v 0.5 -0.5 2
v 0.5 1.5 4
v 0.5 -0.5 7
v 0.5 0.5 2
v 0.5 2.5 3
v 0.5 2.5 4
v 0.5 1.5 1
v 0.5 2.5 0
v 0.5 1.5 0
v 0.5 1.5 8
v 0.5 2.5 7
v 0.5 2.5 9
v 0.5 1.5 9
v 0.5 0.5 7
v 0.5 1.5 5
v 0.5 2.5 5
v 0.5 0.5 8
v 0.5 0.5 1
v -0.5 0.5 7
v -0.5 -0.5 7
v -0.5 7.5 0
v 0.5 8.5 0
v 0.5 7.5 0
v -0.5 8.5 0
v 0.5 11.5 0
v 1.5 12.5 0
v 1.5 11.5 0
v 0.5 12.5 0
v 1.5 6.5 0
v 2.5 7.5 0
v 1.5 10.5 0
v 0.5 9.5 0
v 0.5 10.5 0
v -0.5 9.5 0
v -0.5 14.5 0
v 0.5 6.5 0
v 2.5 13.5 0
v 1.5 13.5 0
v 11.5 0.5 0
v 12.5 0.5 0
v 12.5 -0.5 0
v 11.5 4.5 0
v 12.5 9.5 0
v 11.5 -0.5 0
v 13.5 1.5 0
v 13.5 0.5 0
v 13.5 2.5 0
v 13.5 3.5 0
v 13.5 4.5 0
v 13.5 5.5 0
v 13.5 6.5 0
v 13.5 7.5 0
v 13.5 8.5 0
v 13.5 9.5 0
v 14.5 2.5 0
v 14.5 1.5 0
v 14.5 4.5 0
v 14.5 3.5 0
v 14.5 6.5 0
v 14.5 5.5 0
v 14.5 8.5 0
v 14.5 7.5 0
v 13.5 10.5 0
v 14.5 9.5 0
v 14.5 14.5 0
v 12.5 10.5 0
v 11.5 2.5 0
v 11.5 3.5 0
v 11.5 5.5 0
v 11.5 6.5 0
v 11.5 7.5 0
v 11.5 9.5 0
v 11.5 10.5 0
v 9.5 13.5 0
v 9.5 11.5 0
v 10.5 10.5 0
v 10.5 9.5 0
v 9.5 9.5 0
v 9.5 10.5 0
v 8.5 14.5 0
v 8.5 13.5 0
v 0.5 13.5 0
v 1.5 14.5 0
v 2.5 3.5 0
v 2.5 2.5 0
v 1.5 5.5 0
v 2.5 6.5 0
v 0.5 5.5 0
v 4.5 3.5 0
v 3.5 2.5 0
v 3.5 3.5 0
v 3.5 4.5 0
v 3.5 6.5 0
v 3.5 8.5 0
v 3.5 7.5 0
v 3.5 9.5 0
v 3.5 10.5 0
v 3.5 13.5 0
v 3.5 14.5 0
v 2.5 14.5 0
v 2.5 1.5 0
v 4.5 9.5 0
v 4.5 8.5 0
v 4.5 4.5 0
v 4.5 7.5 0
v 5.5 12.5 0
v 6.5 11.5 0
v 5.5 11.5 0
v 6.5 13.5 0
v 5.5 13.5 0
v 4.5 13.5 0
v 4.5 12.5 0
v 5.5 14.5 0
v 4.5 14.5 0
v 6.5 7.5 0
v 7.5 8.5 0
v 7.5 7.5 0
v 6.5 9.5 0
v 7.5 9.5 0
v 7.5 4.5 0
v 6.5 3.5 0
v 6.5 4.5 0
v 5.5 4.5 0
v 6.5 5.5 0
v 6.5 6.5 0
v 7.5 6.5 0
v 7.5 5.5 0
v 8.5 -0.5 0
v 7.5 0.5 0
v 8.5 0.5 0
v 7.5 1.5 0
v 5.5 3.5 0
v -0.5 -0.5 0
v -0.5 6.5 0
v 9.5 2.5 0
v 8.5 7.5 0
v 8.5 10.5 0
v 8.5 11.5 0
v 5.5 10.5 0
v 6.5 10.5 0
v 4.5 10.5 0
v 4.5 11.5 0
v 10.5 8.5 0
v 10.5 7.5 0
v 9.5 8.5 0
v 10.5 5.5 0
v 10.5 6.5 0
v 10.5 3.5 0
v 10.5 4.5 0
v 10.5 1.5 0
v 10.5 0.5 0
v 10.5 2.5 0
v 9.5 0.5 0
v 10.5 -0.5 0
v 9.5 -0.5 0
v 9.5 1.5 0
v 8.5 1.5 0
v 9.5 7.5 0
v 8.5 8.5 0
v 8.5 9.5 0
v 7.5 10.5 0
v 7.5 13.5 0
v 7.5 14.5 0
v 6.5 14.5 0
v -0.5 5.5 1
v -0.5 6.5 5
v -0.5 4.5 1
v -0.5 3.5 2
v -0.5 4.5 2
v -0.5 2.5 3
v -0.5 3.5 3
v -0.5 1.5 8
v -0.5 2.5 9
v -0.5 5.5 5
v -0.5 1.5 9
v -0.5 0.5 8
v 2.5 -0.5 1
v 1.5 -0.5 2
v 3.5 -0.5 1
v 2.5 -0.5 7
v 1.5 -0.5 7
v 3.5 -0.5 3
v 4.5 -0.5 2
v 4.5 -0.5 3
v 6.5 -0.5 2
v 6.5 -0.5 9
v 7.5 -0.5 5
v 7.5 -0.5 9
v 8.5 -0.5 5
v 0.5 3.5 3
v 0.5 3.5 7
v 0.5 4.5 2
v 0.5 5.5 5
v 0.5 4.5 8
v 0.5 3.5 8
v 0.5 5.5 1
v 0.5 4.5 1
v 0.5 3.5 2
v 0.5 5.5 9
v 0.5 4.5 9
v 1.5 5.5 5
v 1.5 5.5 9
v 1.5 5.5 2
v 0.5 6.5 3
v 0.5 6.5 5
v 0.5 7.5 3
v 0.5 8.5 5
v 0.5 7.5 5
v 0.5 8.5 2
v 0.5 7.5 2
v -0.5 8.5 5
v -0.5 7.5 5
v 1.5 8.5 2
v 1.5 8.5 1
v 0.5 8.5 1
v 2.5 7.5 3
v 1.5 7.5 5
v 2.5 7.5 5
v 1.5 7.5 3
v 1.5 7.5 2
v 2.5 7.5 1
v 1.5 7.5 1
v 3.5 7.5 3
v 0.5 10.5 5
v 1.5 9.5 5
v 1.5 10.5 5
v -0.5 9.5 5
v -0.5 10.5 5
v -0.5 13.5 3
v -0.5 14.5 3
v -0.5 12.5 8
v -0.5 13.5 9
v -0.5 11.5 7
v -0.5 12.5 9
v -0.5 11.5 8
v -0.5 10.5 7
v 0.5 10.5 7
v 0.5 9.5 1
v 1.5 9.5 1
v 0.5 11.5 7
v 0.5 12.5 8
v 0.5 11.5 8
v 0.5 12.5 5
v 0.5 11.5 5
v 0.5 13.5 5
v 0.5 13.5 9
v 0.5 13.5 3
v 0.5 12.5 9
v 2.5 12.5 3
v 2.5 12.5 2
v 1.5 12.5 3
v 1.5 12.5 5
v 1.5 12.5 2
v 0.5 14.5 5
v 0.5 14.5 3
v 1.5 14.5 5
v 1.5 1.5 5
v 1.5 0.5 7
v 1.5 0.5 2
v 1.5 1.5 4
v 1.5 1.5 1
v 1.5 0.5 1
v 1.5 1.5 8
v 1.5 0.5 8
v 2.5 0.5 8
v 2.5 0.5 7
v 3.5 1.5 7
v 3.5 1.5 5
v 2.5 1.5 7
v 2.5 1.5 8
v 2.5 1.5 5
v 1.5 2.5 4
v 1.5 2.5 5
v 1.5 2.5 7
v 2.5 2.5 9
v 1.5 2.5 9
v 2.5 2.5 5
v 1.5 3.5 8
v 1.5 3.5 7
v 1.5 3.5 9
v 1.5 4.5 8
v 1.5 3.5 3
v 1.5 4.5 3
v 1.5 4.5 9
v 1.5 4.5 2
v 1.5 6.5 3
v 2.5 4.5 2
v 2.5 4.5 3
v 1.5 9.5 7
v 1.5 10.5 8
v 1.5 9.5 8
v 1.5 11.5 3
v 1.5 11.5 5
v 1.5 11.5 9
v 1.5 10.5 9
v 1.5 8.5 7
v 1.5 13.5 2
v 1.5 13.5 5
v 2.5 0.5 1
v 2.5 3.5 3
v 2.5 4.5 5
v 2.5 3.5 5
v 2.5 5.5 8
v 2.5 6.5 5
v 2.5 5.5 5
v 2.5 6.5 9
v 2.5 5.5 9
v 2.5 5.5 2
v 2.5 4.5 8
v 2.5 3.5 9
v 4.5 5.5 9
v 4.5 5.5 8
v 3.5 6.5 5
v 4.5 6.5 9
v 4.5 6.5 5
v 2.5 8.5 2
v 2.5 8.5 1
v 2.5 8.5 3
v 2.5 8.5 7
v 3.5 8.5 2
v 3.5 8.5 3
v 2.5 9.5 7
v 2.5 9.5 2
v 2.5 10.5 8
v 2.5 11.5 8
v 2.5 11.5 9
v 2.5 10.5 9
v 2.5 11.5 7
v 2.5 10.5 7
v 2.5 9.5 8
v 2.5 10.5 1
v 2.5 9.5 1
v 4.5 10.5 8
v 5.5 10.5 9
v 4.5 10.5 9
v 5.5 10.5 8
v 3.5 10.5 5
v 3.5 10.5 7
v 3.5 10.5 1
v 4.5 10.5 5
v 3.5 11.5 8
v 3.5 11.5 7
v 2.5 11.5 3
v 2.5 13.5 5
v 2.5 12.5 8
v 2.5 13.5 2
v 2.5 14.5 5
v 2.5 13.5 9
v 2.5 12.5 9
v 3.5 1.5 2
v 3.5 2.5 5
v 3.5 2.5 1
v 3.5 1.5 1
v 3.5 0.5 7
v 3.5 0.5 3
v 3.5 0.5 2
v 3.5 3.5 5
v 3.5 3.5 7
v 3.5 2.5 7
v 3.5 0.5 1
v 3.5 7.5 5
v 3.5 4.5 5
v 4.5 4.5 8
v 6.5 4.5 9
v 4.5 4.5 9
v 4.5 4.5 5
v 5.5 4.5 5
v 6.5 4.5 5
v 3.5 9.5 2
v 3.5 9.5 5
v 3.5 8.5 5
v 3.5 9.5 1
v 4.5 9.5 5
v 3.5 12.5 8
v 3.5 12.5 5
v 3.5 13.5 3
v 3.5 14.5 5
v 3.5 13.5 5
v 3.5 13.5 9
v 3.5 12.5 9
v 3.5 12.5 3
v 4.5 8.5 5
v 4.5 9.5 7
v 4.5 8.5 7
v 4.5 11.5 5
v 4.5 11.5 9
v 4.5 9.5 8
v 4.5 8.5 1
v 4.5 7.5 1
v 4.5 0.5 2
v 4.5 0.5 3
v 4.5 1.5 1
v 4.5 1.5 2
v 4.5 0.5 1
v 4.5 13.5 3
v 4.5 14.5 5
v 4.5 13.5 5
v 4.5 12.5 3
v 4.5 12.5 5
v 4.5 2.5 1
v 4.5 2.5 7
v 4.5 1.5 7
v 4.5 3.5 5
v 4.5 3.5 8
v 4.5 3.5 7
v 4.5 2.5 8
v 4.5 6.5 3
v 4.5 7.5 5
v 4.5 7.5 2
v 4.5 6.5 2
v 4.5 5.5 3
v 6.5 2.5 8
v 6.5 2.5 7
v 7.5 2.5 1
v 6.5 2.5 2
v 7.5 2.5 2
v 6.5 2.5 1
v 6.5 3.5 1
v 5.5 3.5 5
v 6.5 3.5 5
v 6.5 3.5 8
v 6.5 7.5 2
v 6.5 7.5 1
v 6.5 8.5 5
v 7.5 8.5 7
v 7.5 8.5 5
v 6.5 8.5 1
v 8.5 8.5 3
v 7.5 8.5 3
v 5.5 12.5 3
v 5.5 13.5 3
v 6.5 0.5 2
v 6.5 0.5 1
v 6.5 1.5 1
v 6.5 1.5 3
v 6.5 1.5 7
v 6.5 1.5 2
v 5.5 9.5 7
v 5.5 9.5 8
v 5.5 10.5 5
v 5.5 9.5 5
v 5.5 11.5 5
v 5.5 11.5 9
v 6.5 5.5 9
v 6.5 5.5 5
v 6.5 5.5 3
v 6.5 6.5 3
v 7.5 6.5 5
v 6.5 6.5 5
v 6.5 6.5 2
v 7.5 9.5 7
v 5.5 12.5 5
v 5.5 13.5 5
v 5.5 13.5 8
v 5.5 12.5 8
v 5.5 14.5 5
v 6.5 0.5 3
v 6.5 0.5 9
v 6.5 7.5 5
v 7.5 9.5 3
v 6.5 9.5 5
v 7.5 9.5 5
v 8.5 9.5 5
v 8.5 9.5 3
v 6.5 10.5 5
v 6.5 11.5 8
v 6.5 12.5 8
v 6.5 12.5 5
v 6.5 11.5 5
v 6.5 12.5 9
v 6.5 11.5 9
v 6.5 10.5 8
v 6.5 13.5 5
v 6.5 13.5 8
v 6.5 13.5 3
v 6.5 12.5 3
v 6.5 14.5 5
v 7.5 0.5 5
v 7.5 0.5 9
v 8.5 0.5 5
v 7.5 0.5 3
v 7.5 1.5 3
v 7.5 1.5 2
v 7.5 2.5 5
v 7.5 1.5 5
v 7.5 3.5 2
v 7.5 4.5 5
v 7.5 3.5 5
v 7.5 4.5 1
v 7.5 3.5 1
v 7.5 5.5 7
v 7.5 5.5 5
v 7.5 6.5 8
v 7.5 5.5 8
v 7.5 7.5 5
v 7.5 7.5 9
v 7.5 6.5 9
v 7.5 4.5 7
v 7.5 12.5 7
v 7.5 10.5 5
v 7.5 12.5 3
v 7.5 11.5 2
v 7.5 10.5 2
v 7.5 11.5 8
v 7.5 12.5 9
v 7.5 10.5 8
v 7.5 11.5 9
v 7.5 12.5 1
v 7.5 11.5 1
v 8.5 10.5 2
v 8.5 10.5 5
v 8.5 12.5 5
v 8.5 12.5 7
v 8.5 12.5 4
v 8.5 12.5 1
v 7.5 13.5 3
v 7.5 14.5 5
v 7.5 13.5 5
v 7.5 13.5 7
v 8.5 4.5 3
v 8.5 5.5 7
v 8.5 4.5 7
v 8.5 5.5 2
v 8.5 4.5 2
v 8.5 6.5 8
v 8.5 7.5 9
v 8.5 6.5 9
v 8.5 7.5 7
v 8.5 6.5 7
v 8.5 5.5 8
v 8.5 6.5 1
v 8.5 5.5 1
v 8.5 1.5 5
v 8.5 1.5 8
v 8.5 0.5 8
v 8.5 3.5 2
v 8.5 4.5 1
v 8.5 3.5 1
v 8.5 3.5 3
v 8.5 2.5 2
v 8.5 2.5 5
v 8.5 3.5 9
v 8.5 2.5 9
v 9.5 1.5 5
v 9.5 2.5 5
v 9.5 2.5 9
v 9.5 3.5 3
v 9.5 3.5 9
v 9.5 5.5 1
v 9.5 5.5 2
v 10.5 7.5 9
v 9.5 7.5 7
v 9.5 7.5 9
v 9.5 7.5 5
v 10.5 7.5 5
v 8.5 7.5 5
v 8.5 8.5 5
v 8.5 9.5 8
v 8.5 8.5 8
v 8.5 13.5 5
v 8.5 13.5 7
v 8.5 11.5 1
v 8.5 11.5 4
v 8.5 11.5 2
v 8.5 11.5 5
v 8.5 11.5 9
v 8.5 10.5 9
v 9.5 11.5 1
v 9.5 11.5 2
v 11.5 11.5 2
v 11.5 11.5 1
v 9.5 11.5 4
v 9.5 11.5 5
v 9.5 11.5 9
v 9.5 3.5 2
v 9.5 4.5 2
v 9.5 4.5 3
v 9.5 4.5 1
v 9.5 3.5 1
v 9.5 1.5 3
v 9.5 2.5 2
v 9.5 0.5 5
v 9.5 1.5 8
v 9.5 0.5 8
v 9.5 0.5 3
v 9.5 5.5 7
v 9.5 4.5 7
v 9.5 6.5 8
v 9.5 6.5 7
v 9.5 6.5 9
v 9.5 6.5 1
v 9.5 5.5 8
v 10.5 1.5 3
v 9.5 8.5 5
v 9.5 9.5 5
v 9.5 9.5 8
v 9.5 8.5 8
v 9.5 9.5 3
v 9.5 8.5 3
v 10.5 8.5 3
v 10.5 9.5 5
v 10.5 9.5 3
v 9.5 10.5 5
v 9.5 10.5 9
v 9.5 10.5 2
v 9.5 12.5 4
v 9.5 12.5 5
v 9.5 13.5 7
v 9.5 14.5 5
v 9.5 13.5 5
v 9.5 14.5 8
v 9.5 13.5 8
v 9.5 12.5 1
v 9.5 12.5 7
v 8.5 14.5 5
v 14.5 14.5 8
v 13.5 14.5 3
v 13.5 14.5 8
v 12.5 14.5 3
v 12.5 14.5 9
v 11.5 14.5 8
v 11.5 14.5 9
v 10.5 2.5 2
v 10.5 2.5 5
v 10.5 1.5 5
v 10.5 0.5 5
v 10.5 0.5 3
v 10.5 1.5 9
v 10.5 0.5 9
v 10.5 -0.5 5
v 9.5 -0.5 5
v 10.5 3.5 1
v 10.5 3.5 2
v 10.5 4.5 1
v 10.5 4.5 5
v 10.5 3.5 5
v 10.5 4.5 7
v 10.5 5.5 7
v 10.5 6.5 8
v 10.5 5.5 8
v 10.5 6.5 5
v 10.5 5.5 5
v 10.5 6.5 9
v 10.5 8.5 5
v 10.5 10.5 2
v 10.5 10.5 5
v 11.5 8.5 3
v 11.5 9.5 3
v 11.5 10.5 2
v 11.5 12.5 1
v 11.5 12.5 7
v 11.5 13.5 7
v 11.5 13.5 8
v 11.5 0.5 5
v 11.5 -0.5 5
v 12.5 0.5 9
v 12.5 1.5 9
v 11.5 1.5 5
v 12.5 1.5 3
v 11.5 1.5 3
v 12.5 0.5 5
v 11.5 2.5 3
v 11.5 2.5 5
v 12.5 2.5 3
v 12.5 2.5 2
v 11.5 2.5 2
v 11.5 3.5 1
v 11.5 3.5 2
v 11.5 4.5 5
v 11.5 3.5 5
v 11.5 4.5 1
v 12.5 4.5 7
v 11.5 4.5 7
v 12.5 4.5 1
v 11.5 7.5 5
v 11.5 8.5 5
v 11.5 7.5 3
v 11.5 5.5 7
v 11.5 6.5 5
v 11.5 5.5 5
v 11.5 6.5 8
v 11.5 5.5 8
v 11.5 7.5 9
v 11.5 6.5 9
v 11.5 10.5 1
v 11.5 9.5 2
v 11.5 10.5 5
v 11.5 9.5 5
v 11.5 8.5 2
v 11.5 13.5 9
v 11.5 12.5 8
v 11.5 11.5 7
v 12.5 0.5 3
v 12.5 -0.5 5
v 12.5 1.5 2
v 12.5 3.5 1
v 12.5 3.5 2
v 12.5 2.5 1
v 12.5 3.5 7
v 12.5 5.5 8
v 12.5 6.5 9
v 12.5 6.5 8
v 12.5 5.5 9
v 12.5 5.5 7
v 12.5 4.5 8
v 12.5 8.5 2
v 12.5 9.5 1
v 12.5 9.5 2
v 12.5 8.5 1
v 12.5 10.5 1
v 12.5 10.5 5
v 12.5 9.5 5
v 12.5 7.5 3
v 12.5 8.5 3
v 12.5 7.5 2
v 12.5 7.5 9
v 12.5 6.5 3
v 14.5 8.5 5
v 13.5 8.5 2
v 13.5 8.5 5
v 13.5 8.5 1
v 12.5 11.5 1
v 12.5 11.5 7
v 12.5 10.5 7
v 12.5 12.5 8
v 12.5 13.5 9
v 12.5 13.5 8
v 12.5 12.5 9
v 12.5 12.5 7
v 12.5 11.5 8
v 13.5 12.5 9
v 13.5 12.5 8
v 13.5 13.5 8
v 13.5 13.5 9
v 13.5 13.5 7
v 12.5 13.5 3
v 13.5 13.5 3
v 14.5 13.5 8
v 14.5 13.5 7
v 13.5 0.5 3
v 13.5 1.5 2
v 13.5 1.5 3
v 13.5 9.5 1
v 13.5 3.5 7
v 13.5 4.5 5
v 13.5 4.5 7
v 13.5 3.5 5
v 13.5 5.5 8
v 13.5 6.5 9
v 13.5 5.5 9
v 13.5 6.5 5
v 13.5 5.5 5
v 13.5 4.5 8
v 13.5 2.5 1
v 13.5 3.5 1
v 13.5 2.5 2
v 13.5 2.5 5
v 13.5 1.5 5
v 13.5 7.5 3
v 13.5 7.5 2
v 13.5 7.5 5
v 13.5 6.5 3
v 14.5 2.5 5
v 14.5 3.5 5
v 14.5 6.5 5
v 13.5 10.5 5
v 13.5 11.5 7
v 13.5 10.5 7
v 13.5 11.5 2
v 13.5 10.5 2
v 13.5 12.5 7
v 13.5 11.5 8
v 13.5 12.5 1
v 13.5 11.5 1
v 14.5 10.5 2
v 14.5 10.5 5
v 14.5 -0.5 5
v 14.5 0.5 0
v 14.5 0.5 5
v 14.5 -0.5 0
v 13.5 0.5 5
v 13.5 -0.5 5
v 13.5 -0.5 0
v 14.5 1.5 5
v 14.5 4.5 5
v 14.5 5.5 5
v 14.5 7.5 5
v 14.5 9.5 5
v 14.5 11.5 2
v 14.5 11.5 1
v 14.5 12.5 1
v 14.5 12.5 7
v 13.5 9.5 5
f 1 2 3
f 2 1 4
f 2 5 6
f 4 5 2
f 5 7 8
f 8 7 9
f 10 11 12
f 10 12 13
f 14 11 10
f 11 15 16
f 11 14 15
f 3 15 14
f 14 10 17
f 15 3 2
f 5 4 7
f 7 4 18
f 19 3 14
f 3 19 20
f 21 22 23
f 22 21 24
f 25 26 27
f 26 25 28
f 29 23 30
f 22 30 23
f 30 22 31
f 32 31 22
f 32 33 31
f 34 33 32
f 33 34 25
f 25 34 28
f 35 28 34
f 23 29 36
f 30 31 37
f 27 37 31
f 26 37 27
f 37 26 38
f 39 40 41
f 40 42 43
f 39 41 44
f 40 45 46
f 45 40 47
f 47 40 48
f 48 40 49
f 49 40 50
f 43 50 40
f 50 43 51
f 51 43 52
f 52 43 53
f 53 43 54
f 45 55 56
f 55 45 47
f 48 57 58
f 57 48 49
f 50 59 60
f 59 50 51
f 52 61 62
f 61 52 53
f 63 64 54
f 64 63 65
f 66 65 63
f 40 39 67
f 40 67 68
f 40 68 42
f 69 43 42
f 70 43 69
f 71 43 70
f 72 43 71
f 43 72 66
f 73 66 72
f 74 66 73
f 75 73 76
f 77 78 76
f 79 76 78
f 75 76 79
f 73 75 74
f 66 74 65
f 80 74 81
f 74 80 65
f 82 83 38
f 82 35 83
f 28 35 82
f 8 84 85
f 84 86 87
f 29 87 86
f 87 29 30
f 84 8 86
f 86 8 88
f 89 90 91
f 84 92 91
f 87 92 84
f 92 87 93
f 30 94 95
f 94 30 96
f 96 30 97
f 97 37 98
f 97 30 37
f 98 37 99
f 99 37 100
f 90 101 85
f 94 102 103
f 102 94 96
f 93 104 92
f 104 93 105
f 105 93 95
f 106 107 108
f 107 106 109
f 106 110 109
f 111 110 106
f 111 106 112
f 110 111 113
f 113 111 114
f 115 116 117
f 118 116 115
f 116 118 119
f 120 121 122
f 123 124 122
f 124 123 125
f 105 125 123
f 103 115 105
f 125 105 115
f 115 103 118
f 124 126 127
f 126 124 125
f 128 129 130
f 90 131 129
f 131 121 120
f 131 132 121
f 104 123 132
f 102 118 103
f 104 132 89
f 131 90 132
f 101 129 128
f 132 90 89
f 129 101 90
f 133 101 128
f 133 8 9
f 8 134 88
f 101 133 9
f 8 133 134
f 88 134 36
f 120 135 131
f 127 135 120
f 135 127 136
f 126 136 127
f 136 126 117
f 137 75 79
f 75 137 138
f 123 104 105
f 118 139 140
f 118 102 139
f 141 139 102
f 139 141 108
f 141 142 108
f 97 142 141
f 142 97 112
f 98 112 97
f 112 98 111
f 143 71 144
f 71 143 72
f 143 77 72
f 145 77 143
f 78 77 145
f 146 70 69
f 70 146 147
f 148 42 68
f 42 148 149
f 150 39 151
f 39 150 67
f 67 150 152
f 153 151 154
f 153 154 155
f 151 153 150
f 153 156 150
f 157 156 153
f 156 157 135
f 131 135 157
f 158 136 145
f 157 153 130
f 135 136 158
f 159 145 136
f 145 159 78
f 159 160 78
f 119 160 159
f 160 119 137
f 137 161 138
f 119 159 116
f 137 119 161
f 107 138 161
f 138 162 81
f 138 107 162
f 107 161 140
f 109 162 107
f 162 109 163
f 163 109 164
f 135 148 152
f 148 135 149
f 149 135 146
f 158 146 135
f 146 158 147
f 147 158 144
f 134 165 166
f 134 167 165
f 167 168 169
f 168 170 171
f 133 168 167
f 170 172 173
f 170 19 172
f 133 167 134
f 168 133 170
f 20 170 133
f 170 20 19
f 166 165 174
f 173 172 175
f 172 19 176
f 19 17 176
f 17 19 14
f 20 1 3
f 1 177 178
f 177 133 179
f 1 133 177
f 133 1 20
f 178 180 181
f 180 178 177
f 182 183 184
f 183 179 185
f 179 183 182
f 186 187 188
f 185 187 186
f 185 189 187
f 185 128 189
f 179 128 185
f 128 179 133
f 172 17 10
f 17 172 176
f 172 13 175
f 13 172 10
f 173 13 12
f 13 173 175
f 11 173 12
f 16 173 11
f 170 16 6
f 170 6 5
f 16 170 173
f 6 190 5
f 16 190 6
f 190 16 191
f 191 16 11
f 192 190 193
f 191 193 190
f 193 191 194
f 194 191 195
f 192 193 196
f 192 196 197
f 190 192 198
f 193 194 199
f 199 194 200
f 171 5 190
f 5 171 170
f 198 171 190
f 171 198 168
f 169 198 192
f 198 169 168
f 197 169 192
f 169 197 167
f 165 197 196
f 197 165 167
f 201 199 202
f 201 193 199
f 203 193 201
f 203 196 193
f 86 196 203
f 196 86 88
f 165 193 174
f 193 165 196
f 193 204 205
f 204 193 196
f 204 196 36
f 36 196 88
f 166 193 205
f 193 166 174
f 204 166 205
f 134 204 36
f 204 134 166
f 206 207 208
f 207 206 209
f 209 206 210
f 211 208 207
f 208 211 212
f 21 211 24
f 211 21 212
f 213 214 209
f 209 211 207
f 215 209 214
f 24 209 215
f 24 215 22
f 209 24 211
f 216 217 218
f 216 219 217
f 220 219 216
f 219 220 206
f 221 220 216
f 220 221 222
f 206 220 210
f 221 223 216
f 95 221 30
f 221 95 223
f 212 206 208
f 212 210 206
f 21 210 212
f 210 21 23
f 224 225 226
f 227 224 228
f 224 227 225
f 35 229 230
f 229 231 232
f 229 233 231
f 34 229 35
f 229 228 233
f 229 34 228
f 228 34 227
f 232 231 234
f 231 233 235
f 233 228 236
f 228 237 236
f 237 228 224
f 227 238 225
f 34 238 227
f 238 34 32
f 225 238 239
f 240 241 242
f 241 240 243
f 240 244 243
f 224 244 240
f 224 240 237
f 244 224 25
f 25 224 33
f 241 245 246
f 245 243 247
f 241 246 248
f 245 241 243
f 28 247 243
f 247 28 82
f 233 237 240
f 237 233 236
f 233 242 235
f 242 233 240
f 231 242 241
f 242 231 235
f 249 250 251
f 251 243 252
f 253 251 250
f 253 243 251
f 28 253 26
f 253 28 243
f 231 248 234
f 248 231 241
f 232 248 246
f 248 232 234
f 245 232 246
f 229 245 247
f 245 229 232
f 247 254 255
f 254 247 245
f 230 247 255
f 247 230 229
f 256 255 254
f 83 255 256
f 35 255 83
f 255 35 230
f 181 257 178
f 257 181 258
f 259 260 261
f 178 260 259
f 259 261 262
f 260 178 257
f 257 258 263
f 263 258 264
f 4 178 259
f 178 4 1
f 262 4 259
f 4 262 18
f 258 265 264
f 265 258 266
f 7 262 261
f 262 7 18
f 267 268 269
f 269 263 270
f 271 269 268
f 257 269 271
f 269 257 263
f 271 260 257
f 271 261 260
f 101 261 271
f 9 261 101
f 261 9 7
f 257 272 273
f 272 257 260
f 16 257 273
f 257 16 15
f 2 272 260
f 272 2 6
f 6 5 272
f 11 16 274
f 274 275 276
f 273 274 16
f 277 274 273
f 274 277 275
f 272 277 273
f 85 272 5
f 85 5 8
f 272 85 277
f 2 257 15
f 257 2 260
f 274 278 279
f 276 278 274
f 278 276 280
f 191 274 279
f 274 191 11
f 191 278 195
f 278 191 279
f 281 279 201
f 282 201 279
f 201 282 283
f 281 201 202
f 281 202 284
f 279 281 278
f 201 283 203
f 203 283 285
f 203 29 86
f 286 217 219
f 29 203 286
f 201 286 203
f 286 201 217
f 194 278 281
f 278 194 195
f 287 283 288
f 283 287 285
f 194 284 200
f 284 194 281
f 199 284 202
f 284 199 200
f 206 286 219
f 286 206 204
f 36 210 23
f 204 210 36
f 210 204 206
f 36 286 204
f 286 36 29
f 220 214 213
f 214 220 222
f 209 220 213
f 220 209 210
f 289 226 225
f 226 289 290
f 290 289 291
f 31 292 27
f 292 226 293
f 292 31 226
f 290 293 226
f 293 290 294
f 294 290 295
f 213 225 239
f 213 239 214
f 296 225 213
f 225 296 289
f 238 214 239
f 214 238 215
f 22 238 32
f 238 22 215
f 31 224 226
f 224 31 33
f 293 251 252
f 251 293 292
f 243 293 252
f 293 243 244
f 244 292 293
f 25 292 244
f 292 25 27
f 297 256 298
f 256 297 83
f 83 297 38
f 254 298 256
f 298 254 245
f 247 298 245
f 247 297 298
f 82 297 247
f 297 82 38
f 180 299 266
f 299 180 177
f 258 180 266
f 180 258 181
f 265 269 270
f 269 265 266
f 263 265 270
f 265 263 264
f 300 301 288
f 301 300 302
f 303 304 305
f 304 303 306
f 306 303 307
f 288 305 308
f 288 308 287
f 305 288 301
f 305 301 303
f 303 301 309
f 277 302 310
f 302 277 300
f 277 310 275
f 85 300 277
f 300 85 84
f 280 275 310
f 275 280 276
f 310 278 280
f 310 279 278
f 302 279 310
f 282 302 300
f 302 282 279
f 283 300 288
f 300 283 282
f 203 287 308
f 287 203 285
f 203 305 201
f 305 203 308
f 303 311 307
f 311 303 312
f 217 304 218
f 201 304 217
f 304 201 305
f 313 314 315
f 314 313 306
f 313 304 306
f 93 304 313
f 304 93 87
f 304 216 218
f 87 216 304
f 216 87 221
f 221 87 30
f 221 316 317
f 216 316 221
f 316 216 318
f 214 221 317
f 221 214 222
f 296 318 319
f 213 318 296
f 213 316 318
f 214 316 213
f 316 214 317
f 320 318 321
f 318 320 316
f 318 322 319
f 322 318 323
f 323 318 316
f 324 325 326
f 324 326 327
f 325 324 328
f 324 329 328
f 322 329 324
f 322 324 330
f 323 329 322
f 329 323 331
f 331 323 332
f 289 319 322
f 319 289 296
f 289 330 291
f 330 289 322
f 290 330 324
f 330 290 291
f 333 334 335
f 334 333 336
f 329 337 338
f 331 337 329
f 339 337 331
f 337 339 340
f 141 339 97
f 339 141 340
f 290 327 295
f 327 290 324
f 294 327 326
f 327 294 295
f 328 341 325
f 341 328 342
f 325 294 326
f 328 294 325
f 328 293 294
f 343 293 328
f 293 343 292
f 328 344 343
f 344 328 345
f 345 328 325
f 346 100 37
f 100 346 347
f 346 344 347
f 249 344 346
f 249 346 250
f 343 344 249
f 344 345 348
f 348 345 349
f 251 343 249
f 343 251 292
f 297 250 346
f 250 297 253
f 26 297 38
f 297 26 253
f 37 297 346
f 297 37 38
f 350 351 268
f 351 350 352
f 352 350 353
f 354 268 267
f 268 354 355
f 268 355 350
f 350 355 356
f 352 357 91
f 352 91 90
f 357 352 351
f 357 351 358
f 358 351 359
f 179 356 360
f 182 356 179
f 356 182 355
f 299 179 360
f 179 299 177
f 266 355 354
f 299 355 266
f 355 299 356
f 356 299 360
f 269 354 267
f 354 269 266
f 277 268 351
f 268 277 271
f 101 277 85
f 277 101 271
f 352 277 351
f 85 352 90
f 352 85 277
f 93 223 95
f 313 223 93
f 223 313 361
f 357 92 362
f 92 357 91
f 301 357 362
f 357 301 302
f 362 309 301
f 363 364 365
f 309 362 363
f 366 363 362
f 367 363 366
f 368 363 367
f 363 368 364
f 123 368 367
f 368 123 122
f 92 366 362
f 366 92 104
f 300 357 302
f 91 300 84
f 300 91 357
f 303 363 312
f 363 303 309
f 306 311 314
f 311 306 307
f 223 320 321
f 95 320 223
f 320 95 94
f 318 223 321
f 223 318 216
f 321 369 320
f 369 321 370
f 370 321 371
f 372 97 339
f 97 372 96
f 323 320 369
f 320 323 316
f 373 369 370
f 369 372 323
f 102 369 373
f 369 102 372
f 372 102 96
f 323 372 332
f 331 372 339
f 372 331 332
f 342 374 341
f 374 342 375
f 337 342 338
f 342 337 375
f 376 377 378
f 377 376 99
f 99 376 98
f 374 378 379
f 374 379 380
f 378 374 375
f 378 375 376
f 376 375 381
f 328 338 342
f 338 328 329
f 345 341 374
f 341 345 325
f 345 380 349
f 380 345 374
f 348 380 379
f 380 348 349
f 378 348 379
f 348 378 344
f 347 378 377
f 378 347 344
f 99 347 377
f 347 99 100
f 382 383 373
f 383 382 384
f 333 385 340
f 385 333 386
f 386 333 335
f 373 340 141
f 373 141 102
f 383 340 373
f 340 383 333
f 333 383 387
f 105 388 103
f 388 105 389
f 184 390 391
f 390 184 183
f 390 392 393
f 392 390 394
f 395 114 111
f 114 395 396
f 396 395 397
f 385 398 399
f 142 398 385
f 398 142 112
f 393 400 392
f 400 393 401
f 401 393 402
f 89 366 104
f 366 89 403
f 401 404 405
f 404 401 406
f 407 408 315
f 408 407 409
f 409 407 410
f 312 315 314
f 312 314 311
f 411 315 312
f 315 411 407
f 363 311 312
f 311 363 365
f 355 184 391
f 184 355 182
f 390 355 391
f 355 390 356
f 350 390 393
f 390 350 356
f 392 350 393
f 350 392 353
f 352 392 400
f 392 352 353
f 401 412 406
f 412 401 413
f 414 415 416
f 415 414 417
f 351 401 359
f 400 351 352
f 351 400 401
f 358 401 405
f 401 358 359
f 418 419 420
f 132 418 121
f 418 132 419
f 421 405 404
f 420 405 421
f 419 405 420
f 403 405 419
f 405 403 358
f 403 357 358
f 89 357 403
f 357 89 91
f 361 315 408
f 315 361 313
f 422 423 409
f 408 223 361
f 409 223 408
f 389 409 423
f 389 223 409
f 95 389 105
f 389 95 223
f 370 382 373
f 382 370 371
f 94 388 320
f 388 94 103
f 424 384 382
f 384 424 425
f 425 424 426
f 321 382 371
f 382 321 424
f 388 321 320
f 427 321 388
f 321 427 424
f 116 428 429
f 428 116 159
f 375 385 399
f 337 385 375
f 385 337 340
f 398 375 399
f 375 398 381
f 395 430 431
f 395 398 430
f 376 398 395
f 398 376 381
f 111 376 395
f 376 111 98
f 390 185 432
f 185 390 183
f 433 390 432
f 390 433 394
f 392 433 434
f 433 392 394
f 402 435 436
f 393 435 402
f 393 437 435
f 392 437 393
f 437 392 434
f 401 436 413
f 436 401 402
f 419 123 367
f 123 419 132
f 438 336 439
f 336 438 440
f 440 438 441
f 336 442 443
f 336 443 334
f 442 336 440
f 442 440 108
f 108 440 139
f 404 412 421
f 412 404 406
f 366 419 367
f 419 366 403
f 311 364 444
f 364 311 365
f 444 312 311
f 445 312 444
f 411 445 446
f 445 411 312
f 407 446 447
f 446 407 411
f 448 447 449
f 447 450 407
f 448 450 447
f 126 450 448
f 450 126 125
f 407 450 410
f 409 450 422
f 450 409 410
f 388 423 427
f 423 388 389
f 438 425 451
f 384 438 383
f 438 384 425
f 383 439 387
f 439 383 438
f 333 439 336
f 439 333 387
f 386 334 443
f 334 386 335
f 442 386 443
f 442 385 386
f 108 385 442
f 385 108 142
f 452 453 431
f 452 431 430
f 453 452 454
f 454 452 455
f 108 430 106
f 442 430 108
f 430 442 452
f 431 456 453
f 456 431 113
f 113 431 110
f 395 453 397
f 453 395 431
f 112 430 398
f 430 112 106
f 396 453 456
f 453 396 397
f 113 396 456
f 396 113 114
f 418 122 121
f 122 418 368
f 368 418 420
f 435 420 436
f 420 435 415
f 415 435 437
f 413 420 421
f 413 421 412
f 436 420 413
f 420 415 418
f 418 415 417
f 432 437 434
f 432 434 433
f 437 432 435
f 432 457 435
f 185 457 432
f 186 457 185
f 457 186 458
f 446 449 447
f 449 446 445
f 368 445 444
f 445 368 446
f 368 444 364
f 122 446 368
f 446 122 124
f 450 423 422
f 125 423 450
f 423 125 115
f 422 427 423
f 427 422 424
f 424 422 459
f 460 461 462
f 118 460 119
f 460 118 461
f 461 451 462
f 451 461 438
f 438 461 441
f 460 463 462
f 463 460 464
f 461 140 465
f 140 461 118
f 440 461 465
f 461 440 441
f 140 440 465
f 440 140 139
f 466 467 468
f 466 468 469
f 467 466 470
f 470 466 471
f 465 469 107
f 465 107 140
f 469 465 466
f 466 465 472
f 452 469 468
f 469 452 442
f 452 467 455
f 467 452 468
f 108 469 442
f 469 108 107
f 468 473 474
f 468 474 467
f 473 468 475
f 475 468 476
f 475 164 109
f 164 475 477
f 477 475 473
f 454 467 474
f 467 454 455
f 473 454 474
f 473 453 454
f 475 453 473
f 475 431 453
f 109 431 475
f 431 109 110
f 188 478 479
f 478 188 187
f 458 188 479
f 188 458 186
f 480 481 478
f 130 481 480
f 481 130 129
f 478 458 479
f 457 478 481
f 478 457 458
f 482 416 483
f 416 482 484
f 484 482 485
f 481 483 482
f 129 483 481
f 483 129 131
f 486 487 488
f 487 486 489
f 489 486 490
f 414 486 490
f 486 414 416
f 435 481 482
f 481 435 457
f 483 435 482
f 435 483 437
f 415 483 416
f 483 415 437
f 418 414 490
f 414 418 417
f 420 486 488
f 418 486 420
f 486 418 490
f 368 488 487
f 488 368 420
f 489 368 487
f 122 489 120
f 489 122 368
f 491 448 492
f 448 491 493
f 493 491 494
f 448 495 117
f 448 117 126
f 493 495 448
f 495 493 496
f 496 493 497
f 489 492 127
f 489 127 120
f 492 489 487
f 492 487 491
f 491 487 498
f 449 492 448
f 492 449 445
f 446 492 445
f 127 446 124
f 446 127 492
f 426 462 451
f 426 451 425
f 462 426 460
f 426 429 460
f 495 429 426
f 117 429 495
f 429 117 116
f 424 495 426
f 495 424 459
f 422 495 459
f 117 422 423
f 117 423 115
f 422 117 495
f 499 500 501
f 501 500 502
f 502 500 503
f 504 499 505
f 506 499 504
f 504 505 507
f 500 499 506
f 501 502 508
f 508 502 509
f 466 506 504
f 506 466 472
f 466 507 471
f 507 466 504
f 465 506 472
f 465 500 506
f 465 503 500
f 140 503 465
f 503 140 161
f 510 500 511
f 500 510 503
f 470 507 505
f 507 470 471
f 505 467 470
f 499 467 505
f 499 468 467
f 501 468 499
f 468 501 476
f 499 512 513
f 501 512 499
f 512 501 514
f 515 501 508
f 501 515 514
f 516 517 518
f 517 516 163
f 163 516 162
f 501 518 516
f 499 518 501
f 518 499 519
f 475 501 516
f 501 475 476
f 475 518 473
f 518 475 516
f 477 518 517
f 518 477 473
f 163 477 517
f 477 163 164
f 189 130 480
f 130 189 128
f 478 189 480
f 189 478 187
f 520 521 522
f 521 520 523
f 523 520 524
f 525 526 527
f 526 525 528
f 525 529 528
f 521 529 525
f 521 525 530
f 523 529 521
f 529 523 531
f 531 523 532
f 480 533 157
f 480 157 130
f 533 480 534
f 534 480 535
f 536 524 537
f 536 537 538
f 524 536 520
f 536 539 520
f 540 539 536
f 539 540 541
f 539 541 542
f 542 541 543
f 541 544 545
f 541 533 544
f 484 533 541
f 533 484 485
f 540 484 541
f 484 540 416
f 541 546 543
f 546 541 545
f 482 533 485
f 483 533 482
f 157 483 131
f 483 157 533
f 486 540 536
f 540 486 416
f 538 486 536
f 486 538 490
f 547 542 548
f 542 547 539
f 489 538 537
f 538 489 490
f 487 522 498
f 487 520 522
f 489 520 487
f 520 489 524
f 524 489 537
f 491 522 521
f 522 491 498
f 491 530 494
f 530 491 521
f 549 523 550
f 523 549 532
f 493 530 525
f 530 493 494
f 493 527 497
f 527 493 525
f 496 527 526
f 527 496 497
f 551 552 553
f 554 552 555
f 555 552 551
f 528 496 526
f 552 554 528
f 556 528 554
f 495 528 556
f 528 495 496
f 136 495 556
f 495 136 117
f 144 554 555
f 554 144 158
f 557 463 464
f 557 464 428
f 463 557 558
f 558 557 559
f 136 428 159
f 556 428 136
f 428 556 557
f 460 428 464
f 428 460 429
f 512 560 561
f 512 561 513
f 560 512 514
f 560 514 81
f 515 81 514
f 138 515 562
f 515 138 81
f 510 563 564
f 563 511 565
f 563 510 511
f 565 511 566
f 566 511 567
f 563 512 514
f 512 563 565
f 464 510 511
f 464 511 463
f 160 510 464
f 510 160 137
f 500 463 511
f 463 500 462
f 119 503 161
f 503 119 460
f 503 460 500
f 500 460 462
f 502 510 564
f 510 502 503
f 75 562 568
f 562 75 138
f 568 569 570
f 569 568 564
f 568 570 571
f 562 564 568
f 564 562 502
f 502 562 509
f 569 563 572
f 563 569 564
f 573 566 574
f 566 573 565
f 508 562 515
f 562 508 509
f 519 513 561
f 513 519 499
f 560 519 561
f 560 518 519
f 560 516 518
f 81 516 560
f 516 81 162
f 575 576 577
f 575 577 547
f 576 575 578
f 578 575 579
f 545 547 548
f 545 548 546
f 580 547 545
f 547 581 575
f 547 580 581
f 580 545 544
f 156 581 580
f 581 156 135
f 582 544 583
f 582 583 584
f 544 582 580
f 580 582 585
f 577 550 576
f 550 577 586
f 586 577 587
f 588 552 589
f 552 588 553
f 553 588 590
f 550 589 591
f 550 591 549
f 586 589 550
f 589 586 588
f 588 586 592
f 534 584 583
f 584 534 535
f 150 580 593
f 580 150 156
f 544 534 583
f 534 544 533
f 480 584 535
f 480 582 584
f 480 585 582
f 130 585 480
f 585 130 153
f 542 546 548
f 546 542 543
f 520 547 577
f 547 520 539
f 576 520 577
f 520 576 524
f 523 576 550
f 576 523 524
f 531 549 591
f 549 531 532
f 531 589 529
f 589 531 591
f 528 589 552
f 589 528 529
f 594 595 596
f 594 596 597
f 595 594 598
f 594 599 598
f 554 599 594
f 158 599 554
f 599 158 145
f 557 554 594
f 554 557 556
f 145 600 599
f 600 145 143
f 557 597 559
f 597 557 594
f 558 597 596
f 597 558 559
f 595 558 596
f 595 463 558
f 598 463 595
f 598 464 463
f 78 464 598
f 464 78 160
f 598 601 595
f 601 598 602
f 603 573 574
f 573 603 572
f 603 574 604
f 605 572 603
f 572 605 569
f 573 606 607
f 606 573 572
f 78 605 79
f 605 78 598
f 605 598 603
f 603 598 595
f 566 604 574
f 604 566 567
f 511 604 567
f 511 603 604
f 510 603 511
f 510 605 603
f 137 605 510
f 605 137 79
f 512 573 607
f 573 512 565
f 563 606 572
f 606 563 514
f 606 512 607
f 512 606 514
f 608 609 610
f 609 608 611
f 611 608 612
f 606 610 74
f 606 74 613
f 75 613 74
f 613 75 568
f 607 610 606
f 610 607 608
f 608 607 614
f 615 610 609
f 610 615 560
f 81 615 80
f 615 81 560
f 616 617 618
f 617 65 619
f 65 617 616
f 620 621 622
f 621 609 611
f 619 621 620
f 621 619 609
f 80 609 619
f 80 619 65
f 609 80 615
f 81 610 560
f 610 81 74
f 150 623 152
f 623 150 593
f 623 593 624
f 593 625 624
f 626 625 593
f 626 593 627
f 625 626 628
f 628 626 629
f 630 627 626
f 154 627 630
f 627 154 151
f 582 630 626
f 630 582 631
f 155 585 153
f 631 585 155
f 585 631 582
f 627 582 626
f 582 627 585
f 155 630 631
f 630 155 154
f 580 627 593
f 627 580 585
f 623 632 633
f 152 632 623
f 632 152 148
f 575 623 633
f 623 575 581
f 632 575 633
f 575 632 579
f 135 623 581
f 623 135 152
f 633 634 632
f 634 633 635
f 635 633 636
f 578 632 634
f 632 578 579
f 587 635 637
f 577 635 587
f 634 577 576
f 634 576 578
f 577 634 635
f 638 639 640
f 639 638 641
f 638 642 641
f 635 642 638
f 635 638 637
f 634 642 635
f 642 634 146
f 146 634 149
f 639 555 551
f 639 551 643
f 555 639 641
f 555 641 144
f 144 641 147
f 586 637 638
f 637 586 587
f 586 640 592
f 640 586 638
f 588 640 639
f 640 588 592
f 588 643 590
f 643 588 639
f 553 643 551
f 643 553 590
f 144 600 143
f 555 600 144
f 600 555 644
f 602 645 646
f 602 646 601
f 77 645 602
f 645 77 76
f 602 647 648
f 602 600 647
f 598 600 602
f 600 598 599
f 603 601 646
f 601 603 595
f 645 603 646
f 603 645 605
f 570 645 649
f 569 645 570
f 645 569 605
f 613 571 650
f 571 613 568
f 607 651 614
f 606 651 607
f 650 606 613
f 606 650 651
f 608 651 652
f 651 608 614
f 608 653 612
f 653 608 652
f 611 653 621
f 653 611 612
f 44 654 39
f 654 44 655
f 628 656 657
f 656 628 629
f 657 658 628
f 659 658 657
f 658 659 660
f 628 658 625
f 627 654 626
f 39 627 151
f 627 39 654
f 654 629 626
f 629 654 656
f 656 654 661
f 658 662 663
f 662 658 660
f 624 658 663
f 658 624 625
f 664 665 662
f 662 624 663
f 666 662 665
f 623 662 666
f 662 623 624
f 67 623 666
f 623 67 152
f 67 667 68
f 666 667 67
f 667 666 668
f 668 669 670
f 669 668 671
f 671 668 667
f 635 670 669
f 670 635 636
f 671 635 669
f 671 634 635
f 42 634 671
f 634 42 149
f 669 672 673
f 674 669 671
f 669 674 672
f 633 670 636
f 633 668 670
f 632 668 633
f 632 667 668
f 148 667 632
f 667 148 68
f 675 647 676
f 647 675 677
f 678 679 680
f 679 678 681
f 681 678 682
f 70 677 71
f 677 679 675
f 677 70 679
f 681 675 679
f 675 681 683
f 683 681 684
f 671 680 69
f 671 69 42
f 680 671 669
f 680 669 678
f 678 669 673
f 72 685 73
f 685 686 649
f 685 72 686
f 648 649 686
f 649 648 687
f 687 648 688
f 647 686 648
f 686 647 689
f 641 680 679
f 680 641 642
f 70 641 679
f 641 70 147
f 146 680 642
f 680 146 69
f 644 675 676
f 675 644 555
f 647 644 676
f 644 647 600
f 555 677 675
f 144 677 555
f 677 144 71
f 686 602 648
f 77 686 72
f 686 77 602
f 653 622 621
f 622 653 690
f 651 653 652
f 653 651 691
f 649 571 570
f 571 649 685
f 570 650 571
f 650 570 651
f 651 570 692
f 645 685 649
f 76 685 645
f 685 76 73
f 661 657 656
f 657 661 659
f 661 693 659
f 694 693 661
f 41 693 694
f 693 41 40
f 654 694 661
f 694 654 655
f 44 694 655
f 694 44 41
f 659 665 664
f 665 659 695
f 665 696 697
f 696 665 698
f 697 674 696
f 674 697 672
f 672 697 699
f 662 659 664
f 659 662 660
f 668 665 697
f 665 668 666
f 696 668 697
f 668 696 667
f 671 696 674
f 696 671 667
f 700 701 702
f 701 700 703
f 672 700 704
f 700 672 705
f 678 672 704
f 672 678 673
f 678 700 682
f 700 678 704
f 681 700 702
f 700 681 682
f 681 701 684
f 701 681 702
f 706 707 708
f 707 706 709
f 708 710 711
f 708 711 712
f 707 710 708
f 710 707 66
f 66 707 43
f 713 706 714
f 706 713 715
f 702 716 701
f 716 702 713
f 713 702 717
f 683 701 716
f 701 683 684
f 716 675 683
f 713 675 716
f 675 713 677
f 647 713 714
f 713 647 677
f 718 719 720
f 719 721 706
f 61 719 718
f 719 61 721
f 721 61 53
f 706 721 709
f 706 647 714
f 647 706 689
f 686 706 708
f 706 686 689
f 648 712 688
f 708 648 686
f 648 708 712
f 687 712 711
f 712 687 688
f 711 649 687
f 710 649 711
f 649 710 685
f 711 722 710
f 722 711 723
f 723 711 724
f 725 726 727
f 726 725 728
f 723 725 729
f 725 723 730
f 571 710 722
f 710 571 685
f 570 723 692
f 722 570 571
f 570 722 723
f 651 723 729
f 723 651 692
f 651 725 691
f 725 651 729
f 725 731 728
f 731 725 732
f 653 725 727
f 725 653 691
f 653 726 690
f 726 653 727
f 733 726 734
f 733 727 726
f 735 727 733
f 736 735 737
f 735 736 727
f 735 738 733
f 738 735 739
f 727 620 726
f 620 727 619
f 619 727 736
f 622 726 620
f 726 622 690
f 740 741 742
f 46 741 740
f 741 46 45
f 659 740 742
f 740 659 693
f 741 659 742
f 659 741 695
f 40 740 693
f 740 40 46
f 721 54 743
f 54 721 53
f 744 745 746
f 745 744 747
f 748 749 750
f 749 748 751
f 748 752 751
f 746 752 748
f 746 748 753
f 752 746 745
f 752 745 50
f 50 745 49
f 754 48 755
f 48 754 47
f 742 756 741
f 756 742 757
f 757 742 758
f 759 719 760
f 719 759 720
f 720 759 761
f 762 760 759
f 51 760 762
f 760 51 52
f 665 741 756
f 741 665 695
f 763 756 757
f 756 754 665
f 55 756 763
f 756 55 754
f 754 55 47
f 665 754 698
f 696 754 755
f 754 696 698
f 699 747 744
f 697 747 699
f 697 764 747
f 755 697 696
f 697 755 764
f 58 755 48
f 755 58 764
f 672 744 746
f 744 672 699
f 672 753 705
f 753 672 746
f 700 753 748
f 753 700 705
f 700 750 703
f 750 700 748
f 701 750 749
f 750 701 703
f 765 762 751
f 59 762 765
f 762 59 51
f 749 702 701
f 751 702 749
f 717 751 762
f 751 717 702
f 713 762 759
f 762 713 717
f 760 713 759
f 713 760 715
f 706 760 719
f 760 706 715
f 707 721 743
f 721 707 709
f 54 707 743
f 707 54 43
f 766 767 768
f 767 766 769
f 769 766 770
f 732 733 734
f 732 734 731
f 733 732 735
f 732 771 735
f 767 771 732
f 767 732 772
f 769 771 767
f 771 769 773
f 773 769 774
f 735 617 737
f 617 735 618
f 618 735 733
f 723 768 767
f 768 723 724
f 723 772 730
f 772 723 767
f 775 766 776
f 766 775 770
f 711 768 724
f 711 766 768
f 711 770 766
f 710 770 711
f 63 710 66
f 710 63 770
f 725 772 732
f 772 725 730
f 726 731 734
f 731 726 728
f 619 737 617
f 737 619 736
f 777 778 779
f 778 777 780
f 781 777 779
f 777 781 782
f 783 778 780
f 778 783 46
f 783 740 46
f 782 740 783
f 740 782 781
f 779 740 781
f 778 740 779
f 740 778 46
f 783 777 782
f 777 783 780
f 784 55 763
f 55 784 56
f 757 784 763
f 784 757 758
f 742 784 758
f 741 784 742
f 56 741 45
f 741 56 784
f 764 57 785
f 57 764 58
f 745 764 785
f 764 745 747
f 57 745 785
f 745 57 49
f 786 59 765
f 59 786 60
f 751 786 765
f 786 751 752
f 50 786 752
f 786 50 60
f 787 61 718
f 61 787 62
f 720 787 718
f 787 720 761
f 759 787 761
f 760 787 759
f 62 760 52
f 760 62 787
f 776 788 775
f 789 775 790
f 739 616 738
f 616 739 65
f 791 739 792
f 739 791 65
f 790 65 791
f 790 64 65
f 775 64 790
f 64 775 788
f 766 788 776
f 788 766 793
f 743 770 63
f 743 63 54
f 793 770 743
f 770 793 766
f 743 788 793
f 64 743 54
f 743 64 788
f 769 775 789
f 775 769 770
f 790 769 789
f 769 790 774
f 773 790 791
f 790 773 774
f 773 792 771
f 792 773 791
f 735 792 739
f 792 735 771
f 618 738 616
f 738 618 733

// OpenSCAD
union() {
    translate([0, 0, 3.5]) cube([1, 1, 7], center=true);
    translate([0, 1, 4.0]) cube([1, 1, 8], center=true);
    translate([0, 2, 4.5]) cube([1, 1, 9], center=true);
    translate([0, 3, 1.5]) cube([1, 1, 3], center=true);
    translate([0, 4, 1.0]) cube([1, 1, 2], center=true);
    translate([0, 5, 0.5]) cube([1, 1, 1], center=true);
    translate([0, 6, 2.5]) cube([1, 1, 5], center=true);
    translate([0, 8, 2.5]) cube([1, 1, 5], center=true);
    translate([0, 10, 2.5]) cube([1, 1, 5], center=true);
    translate([0, 11, 3.5]) cube([1, 1, 7], center=true);
    translate([0, 12, 4.0]) cube([1, 1, 8], center=true);
    translate([0, 13, 4.5]) cube([1, 1, 9], center=true);
    translate([0, 14, 1.5]) cube([1, 1, 3], center=true);
    translate([1, 0, 1.0]) cube([1, 1, 2], center=true);
    translate([1, 1, 0.5]) cube([1, 1, 1], center=true);
    translate([1, 2, 4.5]) color([1, 0, 0]) cube([1, 1, 1], center=true);
    translate([1, 3, 3.5]) cube([1, 1, 7], center=true);
    translate([1, 4, 4.0]) cube([1, 1, 8], center=true);
    translate([1, 5, 4.5]) cube([1, 1, 9], center=true);
    translate([1, 7, 1.5]) cube([1, 1, 3], center=true);
    translate([1, 8, 1.0]) cube([1, 1, 2], center=true);
    translate([1, 9, 0.5]) cube([1, 1, 1], center=true);
    translate([1, 10, 2.5]) cube([1, 1, 5], center=true);
    translate([1, 12, 2.5]) cube([1, 1, 5], center=true);
    translate([1, 14, 2.5]) cube([1, 1, 5], center=true);
    translate([2, 0, 3.5]) cube([1, 1, 7], center=true);
    translate([2, 1, 4.0]) cube([1, 1, 8], center=true);
    translate([2, 3, 4.5]) cube([1, 1, 9], center=true);
    translate([2, 4, 1.5]) cube([1, 1, 3], center=true);
    translate([2, 5, 1.0]) cube([1, 1, 2], center=true);
    translate([2, 6, 2.5]) cube([1, 1, 5], center=true);
    translate([2, 7, 2.5]) cube([1, 1, 5], center=true);
    translate([2, 8, 0.5]) cube([1, 1, 1], center=true);
    translate([2, 9, 3.5]) cube([1, 1, 7], center=true);
    translate([2, 10, 4.0]) cube([1, 1, 8], center=true);
    translate([2, 11, 4.5]) cube([1, 1, 9], center=true);
    translate([2, 12, 1.5]) cube([1, 1, 3], center=true);
    translate([2, 13, 1.0]) cube([1, 1, 2], center=true);
    translate([3, 0, 0.5]) cube([1, 1, 1], center=true);
    translate([3, 1, 3.5]) cube([1, 1, 7], center=true);
    translate([3, 2, 2.5]) cube([1, 1, 5], center=true);
    translate([3, 4, 2.5]) cube([1, 1, 5], center=true);
    translate([3, 5, 4.0]) cube([1, 1, 8], center=true);
    translate([3, 6, 4.5]) cube([1, 1, 9], center=true);
    translate([3, 8, 1.5]) cube([1, 1, 3], center=true);
    translate([3, 9, 1.0]) cube([1, 1, 2], center=true);
    translate([3, 10, 0.5]) cube([1, 1, 1], center=true);
    translate([3, 11, 3.5]) cube([1, 1, 7], center=true);
    translate([3, 12, 4.0]) cube([1, 1, 8], center=true);
    translate([3, 13, 4.5]) cube([1, 1, 9], center=true);
    translate([3, 14, 2.5]) cube([1, 1, 5], center=true);
    translate([4, 0, 1.5]) cube([1, 1, 3], center=true);
    translate([4, 1, 1.0]) cube([1, 1, 2], center=true);
    translate([4, 2, 0.5]) cube([1, 1, 1], center=true);
    translate([4, 3, 3.5]) cube([1, 1, 7], center=true);
    translate([4, 5, 4.0]) cube([1, 1, 8], center=true);
    translate([4, 6, 4.5]) cube([1, 1, 9], center=true);
    translate([4, 7, 2.5]) cube([1, 1, 5], center=true);
    translate([4, 9, 2.5]) cube([1, 1, 5], center=true);
    translate([4, 11, 2.5]) cube([1, 1, 5], center=true);
    translate([4, 12, 2.5]) cube([1, 1, 5], center=true);
    translate([4, 13, 1.5]) cube([1, 1, 3], center=true);
    translate([5, 0, 1.0]) cube([1, 1, 2], center=true);
    translate([5, 1, 0.5]) cube([1, 1, 1], center=true);
    translate([5, 2, 3.5]) cube([1, 1, 7], center=true);
    translate([5, 3, 4.0]) cube([1, 1, 8], center=true);
    translate([5, 4, 2.5]) cube([1, 1, 5], center=true);
    translate([5, 5, 4.5]) cube([1, 1, 9], center=true);
    translate([5, 6, 1.5]) cube([1, 1, 3], center=true);
    translate([5, 7, 1.0]) cube([1, 1, 2], center=true);
    translate([5, 8, 0.5]) cube([1, 1, 1], center=true);
    translate([5, 9, 3.5]) cube([1, 1, 7], center=true);
    translate([5, 10, 4.0]) cube([1, 1, 8], center=true);
    translate([5, 11, 4.5]) cube([1, 1, 9], center=true);
    translate([5, 13, 1.5]) cube([1, 1, 3], center=true);
    translate([5, 14, 2.5]) cube([1, 1, 5], center=true);
    translate([6, 0, 1.0]) cube([1, 1, 2], center=true);
    translate([6, 1, 0.5]) cube([1, 1, 1], center=true);
    translate([6, 2, 3.5]) cube([1, 1, 7], center=true);
    translate([6, 3, 4.0]) cube([1, 1, 8], center=true);
    translate([6, 5, 4.5]) cube([1, 1, 9], center=true);
    translate([6, 6, 1.5]) cube([1, 1, 3], center=true);
    translate([6, 7, 1.0]) cube([1, 1, 2], center=true);
    translate([6, 8, 0.5]) cube([1, 1, 1], center=true);
    translate([6, 9, 3.5]) cube([1, 1, 7], center=true);
    translate([6, 10, 2.5]) cube([1, 1, 5], center=true);
    translate([6, 12, 2.5]) cube([1, 1, 5], center=true);
    translate([6, 13, 4.0]) cube([1, 1, 8], center=true);
    translate([7, 0, 4.5]) cube([1, 1, 9], center=true);
    translate([7, 1, 1.5]) cube([1, 1, 3], center=true);
    translate([7, 2, 1.0]) cube([1, 1, 2], center=true);
    translate([7, 3, 0.5]) cube([1, 1, 1], center=true);
    translate([7, 4, 2.5]) cube([1, 1, 5], center=true);
    translate([7, 6, 2.5]) cube([1, 1, 5], center=true);
    translate([7, 8, 2.5]) cube([1, 1, 5], center=true);
    translate([7, 9, 3.5]) cube([1, 1, 7], center=true);
    translate([7, 11, 4.0]) cube([1, 1, 8], center=true);
    translate([7, 12, 4.5]) cube([1, 1, 9], center=true);
    translate([7, 13, 1.5]) cube([1, 1, 3], center=true);
    translate([7, 14, 2.5]) cube([1, 1, 5], center=true);
    translate([8, 0, 2.5]) cube([1, 1, 5], center=true);
    translate([8, 2, 2.5]) cube([1, 1, 5], center=true);
    translate([8, 3, 1.0]) cube([1, 1, 2], center=true);
    translate([8, 4, 0.5]) cube([1, 1, 1], center=true);
    translate([8, 5, 3.5]) cube([1, 1, 7], center=true);
    translate([8, 6, 4.0]) cube([1, 1, 8], center=true);
    translate([8, 7, 4.5]) cube([1, 1, 9], center=true);
    translate([8, 9, 1.5]) cube([1, 1, 3], center=true);
    translate([8, 10, 2.5]) cube([1, 1, 5], center=true);
    translate([8, 11, 1.0]) cube([1, 1, 2], center=true);
    translate([8, 12, 0.5]) cube([1, 1, 1], center=true);
    translate([8, 13, 3.5]) cube([1, 1, 7], center=true);
    translate([9, 1, 4.0]) cube([1, 1, 8], center=true);
    translate([9, 2, 2.5]) cube([1, 1, 5], center=true);
    translate([9, 3, 4.5]) cube([1, 1, 9], center=true);
    translate([9, 4, 1.5]) cube([1, 1, 3], center=true);
    translate([9, 5, 1.0]) cube([1, 1, 2], center=true);
    translate([9, 6, 0.5]) cube([1, 1, 1], center=true);
    translate([9, 7, 3.5]) cube([1, 1, 7], center=true);
    translate([9, 8, 2.5]) cube([1, 1, 5], center=true);
    translate([9, 9, 4.0]) cube([1, 1, 8], center=true);
    translate([9, 11, 4.5]) cube([1, 1, 9], center=true);
    translate([9, 12, 4.5]) color([0, 0, 1]) cube([1, 1, 1], center=true);
    translate([9, 14, 2.5]) cube([1, 1, 5], center=true);
    translate([10, 0, 2.5]) cube([1, 1, 5], center=true);
    translate([10, 1, 1.5]) cube([1, 1, 3], center=true);
    translate([10, 3, 1.0]) cube([1, 1, 2], center=true);
    translate([10, 4, 0.5]) cube([1, 1, 1], center=true);
    translate([10, 5, 3.5]) cube([1, 1, 7], center=true);
    translate([10, 6, 4.0]) cube([1, 1, 8], center=true);
    translate([10, 7, 4.5]) cube([1, 1, 9], center=true);
    translate([10, 9, 1.5]) cube([1, 1, 3], center=true);
    translate([10, 10, 2.5]) cube([1, 1, 5], center=true);
    translate([10, 11, 1.0]) cube([1, 1, 2], center=true);
    translate([10, 12, 0.5]) cube([1, 1, 1], center=true);
    translate([10, 13, 3.5]) cube([1, 1, 7], center=true);
    translate([10, 14, 4.0]) cube([1, 1, 8], center=true);
    translate([11, 1, 4.5]) cube([1, 1, 9], center=true);
    translate([11, 2, 2.5]) cube([1, 1, 5], center=true);
    translate([11, 4, 2.5]) cube([1, 1, 5], center=true);
    translate([11, 6, 2.5]) cube([1, 1, 5], center=true);
    translate([11, 8, 2.5]) cube([1, 1, 5], center=true);
    translate([11, 9, 1.5]) cube([1, 1, 3], center=true);
    translate([11, 11, 1.0]) cube([1, 1, 2], center=true);
    translate([11, 12, 0.5]) cube([1, 1, 1], center=true);
    translate([11, 13, 3.5]) cube([1, 1, 7], center=true);
    translate([11, 14, 4.0]) cube([1, 1, 8], center=true);
    translate([12, 0, 2.5]) cube([1, 1, 5], center=true);
    translate([12, 1, 4.5]) cube([1, 1, 9], center=true);
    translate([12, 2, 1.5]) cube([1, 1, 3], center=true);
    translate([12, 3, 1.0]) cube([1, 1, 2], center=true);
    translate([12, 4, 0.5]) cube([1, 1, 1], center=true);
    translate([12, 5, 3.5]) cube([1, 1, 7], center=true);
    translate([12, 6, 4.0]) cube([1, 1, 8], center=true);
    translate([12, 7, 4.5]) cube([1, 1, 9], center=true);
    translate([12, 8, 1.5]) cube([1, 1, 3], center=true);
    translate([12, 9, 1.0]) cube([1, 1, 2], center=true);
    translate([12, 10, 2.5]) cube([1, 1, 5], center=true);
    translate([12, 11, 0.5]) cube([1, 1, 1], center=true);
    translate([12, 12, 3.5]) cube([1, 1, 7], center=true);
    translate([12, 13, 4.0]) cube([1, 1, 8], center=true);
    translate([12, 14, 4.5]) cube([1, 1, 9], center=true);
    translate([13, 1, 1.5]) cube([1, 1, 3], center=true);
    translate([13, 2, 1.0]) cube([1, 1, 2], center=true);
    translate([13, 3, 0.5]) cube([1, 1, 1], center=true);
    translate([13, 4, 3.5]) cube([1, 1, 7], center=true);
    translate([13, 5, 4.0]) cube([1, 1, 8], center=true);
    translate([13, 6, 4.5]) cube([1, 1, 9], center=true);
    translate([13, 7, 1.5]) cube([1, 1, 3], center=true);
    translate([13, 8, 1.0]) cube([1, 1, 2], center=true);
    translate([13, 9, 0.5]) cube([1, 1, 1], center=true);
    translate([13, 11, 3.5]) cube([1, 1, 7], center=true);
    translate([13, 12, 4.0]) cube([1, 1, 8], center=true);
    translate([13, 13, 4.5]) cube([1, 1, 9], center=true);
    translate([13, 14, 1.5]) cube([1, 1, 3], center=true);
    translate([14, 0, 2.5]) cube([1, 1, 5], center=true);
    translate([14, 2, 2.5]) cube([1, 1, 5], center=true);
    translate([14, 4, 2.5]) cube([1, 1, 5], center=true);
    translate([14, 6, 2.5]) cube([1, 1, 5], center=true);
    translate([14, 8, 2.5]) cube([1, 1, 5], center=true);
    translate([14, 10, 2.5]) cube([1, 1, 5], center=true);
    translate([14, 11, 1.0]) cube([1, 1, 2], center=true);
    translate([14, 12, 0.5]) cube([1, 1, 1], center=true);
    translate([14, 13, 3.5]) cube([1, 1, 7], center=true);
    translate([14, 14, 4.0]) cube([1, 1, 8], center=true);
}
